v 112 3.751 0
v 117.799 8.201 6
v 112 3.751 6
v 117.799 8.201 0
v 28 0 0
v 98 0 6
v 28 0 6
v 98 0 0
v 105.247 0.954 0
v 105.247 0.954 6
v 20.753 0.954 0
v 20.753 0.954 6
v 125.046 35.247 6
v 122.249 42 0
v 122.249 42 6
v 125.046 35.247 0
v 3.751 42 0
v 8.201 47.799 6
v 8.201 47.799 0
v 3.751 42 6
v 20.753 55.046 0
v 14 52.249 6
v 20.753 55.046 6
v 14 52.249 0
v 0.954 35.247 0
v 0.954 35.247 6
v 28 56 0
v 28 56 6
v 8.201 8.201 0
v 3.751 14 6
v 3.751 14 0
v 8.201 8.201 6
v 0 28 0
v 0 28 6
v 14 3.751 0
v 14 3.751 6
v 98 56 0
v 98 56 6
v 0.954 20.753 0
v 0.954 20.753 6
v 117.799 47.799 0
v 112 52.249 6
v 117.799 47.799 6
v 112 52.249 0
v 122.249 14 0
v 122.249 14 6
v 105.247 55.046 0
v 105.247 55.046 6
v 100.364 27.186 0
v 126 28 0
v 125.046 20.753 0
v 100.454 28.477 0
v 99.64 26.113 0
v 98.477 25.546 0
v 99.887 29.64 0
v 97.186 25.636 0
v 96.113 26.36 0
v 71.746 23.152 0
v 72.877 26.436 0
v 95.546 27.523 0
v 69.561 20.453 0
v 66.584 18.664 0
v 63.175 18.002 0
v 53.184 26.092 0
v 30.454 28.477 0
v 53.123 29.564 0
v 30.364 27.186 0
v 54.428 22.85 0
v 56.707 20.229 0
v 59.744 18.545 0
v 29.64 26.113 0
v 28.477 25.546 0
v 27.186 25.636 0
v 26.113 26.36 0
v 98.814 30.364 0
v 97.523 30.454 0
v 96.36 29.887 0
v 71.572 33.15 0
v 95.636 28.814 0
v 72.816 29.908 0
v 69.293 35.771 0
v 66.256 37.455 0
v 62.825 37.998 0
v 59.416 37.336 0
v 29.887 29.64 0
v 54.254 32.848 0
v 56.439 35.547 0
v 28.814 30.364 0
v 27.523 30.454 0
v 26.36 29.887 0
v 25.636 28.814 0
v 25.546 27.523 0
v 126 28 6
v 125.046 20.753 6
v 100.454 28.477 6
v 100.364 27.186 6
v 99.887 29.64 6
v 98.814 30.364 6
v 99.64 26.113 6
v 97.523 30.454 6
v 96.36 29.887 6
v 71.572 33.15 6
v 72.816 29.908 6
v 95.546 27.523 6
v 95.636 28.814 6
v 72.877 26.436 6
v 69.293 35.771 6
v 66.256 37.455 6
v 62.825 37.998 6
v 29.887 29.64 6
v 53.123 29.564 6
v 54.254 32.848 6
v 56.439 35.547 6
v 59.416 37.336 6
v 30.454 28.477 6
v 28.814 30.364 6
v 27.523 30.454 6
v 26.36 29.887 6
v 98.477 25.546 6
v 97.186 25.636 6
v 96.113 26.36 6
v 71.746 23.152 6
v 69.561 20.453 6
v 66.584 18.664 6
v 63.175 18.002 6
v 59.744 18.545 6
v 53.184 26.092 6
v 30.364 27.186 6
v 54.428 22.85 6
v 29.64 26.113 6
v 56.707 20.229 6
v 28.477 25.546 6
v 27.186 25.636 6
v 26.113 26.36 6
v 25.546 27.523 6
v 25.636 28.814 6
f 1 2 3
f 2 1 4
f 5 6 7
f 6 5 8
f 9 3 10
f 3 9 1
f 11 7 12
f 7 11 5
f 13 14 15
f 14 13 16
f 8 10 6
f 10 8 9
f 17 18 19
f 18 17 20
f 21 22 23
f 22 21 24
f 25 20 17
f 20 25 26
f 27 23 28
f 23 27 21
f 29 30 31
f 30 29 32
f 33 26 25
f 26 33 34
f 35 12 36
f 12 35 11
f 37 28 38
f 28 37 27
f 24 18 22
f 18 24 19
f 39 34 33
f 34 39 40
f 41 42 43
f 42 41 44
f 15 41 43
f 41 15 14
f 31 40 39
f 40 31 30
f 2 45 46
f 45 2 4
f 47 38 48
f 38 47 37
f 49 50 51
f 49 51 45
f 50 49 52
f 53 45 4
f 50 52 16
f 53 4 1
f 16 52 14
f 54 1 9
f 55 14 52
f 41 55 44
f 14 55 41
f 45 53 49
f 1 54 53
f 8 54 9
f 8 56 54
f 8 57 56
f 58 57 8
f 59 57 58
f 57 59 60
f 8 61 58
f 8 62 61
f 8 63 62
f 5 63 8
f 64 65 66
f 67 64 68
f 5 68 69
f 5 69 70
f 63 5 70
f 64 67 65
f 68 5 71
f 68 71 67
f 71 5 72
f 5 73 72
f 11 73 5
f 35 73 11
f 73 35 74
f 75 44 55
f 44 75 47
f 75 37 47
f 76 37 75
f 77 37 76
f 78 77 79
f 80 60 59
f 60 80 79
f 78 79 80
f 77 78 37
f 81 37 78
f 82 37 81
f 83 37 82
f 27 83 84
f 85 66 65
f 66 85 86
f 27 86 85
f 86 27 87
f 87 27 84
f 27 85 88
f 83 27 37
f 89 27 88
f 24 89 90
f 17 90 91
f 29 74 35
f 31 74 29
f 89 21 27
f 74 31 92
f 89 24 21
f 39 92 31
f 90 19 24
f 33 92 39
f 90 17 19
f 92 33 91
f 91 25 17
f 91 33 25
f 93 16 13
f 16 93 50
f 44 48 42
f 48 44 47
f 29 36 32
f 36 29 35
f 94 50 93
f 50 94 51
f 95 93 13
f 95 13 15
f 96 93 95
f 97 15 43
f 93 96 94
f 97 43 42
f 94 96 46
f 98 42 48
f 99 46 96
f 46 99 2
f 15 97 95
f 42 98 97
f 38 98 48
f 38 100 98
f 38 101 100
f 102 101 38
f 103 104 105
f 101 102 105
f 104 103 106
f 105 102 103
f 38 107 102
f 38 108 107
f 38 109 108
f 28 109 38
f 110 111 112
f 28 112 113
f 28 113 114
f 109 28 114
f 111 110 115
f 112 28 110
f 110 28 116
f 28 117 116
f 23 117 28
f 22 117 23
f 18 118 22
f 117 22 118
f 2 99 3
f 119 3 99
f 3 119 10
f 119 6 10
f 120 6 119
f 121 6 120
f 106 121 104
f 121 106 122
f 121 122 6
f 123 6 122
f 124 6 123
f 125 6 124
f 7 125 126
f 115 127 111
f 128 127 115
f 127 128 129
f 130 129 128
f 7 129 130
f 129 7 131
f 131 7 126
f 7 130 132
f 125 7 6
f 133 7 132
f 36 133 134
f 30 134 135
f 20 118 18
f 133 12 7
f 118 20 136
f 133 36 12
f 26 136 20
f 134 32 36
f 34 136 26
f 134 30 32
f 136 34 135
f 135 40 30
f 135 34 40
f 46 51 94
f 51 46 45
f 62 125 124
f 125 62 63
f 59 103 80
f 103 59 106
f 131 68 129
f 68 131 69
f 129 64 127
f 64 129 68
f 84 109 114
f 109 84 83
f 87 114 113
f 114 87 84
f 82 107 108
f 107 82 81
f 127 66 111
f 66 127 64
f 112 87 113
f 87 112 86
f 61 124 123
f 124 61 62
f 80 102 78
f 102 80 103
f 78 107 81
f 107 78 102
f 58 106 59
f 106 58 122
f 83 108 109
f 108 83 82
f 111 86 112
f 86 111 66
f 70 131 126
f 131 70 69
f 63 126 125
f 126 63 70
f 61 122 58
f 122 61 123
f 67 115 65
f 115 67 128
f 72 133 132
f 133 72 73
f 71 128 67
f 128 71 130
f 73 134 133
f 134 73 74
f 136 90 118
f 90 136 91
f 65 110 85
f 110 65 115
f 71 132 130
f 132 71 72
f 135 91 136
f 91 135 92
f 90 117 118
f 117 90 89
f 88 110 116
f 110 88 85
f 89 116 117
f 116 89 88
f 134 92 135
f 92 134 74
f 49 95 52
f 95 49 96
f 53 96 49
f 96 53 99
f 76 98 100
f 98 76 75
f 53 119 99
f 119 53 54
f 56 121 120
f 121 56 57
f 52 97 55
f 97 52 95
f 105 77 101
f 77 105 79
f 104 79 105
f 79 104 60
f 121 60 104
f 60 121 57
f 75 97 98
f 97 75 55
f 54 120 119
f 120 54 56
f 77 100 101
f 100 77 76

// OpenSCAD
$fn = 32;

// ----------------------------------------------------------------------
// Spacer plate: obround span 70, caps R28
// ----------------------------------------------------------------------

// --- parameters (mm) ---
bore_r = 10;              // centre bore radius
bolt_r = 2.5;             // bolt hole radius
plate_t = 6;              // plate thickness, Z (extrusion height)
span = 70;                // obround span
cap_r = 28;               // cap radius

profile = [[28, 56], [20.753, 55.046], [14, 52.249], [8.201, 47.799], [3.751, 42], [0.954, 35.247], [0, 28], [0.954, 20.753], [3.751, 14], [8.201, 8.201], [14, 3.751], [20.753, 0.954], [28, 0], [98, 0], [105.247, 0.954], [112, 3.751], [117.799, 8.201], [122.249, 14], [125.046, 20.753], [126, 28], [125.046, 35.247], [122.249, 42], [117.799, 47.799], [112, 52.249], [105.247, 55.046], [98, 56]];  // primary outline, 26 points, counter clockwise
void_1 = [[72.816, 29.908], [71.572, 33.15], [69.293, 35.771], [66.256, 37.455], [62.825, 37.998], [59.416, 37.336], [56.439, 35.547], [54.254, 32.848], [53.123, 29.564], [53.184, 26.092], [54.428, 22.85], [56.707, 20.229], [59.744, 18.545], [63.175, 18.002], [66.584, 18.664], [69.561, 20.453], [71.746, 23.152], [72.877, 26.436]];  // centre bore, 18 points
void_2 = [[30.454, 28.477], [29.887, 29.64], [28.814, 30.364], [27.523, 30.454], [26.36, 29.887], [25.636, 28.814], [25.546, 27.523], [26.113, 26.36], [27.186, 25.636], [28.477, 25.546], [29.64, 26.113], [30.364, 27.186]];  // end hole, 12 points
void_3 = [[100.454, 28.477], [99.887, 29.64], [98.814, 30.364], [97.523, 30.454], [96.36, 29.887], [95.636, 28.814], [95.546, 27.523], [96.113, 26.36], [97.186, 25.636], [98.477, 25.546], [99.64, 26.113], [100.364, 27.186]];  // end hole, 12 points

// --- the one profile operation ---
difference() {
  linear_extrude(height = plate_t) polygon(points = profile);
  translate([0, 0, -1])
    linear_extrude(height = plate_t + 2) polygon(points = void_1);
  translate([0, 0, -1])
    linear_extrude(height = plate_t + 2) polygon(points = void_2);
  translate([0, 0, -1])
    linear_extrude(height = plate_t + 2) polygon(points = void_3);
}
